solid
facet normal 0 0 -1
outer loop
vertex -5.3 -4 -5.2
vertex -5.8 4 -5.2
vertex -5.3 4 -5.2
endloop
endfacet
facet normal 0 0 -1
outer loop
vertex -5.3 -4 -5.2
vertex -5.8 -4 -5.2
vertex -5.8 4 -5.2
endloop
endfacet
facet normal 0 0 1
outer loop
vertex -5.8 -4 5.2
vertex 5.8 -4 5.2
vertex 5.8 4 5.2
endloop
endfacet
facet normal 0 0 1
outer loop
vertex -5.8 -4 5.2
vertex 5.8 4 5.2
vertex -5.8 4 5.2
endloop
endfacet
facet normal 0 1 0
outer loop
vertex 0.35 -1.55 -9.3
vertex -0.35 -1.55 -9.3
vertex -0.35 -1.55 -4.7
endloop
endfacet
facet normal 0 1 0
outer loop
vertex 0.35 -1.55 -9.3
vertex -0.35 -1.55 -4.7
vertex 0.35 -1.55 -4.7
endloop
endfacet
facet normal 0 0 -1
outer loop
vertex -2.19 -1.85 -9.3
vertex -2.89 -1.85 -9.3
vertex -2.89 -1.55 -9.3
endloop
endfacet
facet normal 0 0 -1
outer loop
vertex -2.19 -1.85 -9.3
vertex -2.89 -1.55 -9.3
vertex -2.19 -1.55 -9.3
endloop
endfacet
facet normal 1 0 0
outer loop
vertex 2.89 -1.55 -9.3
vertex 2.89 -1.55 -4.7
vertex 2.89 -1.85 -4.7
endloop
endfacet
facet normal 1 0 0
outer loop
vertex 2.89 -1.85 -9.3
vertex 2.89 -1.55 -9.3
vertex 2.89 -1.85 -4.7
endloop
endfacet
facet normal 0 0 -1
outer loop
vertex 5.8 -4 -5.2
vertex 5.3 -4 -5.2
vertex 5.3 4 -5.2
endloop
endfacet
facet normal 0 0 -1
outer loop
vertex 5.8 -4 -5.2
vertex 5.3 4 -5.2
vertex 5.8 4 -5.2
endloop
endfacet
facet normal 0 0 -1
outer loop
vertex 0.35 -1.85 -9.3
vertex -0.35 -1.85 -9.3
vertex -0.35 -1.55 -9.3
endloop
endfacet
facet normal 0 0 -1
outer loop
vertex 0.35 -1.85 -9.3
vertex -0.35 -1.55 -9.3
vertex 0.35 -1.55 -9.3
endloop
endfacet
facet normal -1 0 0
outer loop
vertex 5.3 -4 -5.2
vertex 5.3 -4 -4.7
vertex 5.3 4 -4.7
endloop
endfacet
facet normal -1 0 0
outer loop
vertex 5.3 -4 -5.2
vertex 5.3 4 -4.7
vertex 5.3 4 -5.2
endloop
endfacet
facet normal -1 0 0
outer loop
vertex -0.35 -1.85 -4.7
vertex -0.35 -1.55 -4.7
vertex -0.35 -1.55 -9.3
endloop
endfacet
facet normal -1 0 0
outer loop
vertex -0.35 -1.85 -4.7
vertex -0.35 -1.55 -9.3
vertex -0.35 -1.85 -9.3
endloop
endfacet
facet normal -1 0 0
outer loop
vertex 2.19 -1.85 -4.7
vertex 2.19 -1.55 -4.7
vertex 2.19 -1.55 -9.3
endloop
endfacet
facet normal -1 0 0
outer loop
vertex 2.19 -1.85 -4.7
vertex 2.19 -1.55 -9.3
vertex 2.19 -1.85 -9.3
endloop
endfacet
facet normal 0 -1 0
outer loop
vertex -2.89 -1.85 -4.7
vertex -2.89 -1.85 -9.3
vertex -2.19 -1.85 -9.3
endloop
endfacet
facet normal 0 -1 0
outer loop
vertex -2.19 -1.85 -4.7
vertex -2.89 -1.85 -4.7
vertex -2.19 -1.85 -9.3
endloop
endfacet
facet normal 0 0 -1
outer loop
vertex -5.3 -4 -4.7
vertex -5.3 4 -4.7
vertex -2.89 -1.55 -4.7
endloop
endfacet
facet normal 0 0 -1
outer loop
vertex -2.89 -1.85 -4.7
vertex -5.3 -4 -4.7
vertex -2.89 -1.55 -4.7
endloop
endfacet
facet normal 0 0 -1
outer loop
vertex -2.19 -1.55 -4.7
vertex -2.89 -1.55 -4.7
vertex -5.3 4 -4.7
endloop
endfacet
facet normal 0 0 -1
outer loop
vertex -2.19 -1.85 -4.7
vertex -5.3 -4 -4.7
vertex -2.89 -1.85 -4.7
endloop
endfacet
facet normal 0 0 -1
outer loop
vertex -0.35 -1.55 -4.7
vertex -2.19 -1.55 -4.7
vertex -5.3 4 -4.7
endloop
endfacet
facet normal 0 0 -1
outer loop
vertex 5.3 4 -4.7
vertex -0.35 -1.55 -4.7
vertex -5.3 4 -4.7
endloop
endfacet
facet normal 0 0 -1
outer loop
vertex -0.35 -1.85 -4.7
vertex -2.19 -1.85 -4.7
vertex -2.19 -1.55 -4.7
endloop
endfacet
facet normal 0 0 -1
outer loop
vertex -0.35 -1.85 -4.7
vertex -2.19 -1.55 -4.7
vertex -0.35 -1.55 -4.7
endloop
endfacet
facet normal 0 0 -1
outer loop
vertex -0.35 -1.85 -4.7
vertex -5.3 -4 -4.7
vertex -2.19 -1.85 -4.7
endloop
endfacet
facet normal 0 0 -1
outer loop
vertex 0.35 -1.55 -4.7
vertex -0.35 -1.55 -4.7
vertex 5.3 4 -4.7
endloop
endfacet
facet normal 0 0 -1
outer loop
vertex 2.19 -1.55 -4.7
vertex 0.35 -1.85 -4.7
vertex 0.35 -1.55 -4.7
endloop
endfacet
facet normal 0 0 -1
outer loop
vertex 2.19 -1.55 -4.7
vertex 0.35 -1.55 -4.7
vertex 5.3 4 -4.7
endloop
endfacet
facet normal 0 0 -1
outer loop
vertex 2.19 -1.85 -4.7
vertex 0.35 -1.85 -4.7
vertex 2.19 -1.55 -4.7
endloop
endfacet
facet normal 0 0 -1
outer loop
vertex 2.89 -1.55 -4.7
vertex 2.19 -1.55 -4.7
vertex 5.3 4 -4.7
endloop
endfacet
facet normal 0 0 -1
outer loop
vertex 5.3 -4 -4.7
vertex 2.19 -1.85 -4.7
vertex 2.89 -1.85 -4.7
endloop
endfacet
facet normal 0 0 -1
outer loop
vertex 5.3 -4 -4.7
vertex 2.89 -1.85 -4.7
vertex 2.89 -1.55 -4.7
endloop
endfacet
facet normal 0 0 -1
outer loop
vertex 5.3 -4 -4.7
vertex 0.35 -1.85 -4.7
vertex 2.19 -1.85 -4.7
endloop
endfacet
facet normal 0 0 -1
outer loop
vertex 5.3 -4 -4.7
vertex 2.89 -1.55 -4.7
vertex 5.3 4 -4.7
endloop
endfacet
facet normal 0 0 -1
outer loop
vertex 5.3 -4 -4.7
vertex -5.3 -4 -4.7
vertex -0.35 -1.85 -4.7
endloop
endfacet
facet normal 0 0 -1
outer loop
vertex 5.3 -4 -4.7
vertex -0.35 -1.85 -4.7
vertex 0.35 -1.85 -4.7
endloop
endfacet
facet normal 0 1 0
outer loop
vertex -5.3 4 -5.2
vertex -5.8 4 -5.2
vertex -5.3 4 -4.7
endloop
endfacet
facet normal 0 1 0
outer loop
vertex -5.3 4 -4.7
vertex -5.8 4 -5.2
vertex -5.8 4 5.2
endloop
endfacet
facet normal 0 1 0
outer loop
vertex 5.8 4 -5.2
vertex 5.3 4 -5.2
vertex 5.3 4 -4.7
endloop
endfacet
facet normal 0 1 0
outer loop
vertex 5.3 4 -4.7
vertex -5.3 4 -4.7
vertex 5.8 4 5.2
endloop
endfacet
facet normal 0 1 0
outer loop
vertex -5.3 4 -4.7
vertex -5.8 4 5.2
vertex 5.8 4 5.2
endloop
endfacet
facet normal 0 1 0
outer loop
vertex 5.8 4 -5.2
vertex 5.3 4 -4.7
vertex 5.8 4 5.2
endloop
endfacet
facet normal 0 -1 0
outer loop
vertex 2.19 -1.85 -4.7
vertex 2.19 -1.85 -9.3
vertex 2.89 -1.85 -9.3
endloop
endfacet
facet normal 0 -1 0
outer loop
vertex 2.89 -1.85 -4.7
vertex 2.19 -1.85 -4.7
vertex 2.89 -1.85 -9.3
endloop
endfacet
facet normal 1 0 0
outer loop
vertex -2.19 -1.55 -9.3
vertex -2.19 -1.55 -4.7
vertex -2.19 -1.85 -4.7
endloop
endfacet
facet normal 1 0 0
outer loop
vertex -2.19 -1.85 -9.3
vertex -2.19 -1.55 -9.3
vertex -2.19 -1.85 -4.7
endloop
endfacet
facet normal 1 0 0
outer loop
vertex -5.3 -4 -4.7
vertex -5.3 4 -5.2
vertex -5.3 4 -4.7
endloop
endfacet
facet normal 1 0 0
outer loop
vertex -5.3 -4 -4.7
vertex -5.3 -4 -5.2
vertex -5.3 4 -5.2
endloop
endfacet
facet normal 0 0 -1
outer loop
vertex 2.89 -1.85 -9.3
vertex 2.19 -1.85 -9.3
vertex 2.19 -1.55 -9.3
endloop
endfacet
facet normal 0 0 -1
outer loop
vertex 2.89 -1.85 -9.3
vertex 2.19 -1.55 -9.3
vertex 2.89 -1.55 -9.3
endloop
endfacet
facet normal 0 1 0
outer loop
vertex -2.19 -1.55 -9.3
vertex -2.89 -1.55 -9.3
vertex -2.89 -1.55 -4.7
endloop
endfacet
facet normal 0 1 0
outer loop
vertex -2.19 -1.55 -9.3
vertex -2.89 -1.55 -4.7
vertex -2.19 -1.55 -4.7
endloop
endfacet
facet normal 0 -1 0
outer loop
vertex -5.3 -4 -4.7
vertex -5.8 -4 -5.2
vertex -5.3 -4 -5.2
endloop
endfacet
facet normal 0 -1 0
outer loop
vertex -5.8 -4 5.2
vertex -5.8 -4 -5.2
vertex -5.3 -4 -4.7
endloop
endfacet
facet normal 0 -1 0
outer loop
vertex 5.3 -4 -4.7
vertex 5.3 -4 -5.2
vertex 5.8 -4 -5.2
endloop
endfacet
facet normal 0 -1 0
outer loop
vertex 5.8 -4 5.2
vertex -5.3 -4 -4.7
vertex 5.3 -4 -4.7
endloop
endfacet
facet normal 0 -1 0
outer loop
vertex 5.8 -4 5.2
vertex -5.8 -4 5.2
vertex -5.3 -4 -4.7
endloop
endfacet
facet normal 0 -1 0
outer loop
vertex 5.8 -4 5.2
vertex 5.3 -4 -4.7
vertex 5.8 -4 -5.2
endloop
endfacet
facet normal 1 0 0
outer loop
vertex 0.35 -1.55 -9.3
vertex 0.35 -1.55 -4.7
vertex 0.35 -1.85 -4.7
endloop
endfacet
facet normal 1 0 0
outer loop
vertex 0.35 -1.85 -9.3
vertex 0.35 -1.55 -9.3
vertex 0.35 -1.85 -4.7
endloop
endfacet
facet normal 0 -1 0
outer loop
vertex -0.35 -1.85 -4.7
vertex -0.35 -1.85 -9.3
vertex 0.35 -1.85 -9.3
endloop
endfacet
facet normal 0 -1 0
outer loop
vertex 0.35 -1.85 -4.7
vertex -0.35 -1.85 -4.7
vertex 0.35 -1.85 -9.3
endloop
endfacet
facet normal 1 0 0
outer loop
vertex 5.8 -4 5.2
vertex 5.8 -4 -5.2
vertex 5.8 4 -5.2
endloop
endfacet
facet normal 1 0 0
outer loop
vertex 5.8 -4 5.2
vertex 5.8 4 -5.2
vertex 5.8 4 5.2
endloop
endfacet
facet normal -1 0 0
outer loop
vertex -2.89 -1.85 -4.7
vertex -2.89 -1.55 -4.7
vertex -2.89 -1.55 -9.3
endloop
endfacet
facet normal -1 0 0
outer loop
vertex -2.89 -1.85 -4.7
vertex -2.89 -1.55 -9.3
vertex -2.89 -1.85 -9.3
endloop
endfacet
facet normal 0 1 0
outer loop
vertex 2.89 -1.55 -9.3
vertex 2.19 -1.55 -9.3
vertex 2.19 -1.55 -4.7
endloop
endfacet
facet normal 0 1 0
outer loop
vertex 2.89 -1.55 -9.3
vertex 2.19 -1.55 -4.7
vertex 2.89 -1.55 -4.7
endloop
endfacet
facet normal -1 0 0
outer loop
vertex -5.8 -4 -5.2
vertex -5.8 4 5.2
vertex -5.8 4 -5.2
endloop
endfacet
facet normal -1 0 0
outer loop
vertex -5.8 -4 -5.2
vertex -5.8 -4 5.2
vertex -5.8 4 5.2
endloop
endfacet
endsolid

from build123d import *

# Parameters (mm, degrees)
PAD_DEPTH    = 4
SKETCH001_W  = 0.7
SKETCH001_H  = 0.3
PAD001_DEPTH = 4.6


with BuildPart() as part:
    # Sketch → Pad (new body, symmetric)
    with BuildSketch(Plane.XZ):
        Polygon((-5.3, -5.2), (-5.3, -4.7), (5.3, -4.7), (5.3, -5.2), (5.8, -5.2), (5.8, 5.2), (-5.8, 5.2), (-5.8, -5.2), align=None)
    extrude(amount=PAD_DEPTH, both=True)

    # Sketch001 (on Face2 of Pad) → Pad001 (join)
    with BuildSketch(Plane(origin=(0, 0, -4.7), x_dir=(1, 0, 0), z_dir=(0, 0, -1))):
        with Locations((-2.54, 1.7)):
            Rectangle(SKETCH001_W, SKETCH001_H)
        with Locations((0, 1.7)):
            Rectangle(SKETCH001_W, SKETCH001_H)
        with Locations((2.54, 1.7)):
            Rectangle(SKETCH001_W, SKETCH001_H)
    extrude(amount=PAD001_DEPTH)


solid = part.part
